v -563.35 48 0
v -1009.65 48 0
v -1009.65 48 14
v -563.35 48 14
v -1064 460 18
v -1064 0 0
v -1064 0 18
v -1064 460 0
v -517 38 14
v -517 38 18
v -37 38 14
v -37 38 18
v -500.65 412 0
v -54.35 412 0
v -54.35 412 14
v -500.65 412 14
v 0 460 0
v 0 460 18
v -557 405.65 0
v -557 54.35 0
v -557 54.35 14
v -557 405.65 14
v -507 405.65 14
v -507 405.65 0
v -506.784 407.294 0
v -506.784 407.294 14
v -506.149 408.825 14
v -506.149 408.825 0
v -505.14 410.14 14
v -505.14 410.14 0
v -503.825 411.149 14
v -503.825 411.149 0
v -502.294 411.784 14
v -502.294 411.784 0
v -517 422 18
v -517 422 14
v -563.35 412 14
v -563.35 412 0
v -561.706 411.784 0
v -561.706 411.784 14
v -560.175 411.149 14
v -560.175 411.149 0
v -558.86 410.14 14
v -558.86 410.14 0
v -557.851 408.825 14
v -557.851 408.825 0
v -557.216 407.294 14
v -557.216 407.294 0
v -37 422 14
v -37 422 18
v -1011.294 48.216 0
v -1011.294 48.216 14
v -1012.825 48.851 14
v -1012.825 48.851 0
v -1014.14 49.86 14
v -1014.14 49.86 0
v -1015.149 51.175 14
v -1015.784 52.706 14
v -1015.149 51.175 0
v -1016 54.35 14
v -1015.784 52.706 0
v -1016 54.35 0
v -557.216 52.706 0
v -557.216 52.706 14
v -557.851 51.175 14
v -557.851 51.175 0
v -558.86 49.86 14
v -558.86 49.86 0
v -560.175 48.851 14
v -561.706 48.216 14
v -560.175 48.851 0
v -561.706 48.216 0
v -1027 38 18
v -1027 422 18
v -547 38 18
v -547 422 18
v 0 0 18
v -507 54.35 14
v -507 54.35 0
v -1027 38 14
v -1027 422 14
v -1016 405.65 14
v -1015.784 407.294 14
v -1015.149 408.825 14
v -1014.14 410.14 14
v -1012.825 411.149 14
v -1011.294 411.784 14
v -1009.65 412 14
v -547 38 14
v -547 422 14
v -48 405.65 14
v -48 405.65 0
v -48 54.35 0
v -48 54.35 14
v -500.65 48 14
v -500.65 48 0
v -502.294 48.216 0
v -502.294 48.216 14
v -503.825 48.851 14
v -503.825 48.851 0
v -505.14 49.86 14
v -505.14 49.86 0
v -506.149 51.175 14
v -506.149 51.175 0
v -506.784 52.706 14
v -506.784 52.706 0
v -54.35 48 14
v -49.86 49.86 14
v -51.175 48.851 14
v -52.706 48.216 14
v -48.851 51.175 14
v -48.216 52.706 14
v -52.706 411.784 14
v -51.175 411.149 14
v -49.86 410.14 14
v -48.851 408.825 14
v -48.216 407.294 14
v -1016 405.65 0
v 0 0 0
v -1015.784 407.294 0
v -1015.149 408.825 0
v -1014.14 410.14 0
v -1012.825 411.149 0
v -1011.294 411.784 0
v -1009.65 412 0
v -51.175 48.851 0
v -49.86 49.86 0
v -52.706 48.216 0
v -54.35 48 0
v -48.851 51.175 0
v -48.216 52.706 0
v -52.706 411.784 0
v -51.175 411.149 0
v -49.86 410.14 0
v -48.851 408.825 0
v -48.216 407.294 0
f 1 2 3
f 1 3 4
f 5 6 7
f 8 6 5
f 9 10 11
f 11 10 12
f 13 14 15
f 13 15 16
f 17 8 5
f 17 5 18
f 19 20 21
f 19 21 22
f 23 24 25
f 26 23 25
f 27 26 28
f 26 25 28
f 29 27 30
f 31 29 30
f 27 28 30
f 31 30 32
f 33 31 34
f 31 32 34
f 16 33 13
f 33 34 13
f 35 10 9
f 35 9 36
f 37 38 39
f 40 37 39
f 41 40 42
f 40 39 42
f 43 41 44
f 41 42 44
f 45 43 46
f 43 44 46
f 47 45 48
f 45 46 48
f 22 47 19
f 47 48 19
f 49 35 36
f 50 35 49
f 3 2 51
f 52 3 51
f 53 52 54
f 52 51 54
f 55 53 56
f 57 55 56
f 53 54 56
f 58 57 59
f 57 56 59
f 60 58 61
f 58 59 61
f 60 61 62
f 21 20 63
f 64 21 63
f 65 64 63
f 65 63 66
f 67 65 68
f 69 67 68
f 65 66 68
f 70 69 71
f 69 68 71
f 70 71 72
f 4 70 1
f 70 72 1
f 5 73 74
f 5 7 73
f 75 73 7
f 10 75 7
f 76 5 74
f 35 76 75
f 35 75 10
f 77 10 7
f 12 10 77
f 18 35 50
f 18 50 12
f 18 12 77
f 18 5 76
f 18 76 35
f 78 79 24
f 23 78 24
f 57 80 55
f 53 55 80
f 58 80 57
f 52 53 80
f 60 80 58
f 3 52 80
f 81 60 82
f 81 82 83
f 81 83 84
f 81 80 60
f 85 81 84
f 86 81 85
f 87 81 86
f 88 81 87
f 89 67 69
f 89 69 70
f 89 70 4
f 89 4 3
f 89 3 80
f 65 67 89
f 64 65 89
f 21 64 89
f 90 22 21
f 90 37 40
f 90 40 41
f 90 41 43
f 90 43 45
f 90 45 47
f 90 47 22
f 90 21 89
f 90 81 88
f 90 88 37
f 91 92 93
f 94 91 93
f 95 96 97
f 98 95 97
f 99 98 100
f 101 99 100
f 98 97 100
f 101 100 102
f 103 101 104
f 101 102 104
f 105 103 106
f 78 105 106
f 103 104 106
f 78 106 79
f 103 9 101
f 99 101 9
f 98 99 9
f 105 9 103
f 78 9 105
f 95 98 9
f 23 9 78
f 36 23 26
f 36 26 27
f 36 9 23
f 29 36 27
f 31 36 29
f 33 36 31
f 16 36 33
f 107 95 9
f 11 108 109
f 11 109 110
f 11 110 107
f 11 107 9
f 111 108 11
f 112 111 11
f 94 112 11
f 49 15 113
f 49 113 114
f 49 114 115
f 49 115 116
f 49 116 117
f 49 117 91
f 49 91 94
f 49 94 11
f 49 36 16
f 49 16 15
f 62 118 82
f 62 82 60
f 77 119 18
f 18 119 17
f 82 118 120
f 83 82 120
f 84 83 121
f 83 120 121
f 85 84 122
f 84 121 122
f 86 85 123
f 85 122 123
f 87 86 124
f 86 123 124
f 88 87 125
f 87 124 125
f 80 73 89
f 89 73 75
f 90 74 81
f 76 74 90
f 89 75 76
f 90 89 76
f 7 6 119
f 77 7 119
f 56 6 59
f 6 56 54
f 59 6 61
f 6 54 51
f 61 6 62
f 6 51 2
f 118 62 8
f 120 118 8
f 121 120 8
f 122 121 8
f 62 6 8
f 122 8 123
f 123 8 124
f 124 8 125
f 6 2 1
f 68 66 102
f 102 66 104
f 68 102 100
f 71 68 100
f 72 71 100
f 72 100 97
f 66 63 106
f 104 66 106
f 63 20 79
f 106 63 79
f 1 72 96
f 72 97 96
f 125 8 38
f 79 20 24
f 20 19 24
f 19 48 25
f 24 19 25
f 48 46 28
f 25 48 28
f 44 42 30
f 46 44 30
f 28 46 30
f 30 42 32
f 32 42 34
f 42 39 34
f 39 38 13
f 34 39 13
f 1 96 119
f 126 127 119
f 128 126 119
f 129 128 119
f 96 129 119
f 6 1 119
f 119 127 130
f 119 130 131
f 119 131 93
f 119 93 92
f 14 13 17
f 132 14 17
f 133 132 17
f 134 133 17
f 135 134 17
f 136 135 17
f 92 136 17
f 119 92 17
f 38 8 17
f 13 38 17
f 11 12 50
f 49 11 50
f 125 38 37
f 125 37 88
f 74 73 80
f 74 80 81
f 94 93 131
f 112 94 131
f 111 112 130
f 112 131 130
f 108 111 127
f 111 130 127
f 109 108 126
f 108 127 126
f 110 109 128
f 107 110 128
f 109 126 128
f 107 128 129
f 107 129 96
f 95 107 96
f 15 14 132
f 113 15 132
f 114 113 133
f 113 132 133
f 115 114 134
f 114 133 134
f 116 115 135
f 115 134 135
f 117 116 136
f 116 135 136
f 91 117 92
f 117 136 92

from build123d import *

# Parameters (mm, degrees)
SKETCH_W        = 1064
SKETCH_H        = 460
PAD_DEPTH       = 18
POCKET003_DEPTH = 18.001
SKETCH005_W     = 480
SKETCH005_H     = 384
POCKET_DEPTH    = 4


with BuildPart() as part:
    # Sketch → Pad (new body)
    with BuildSketch(Plane.XY):
        with Locations((-532, 230)):
            Rectangle(SKETCH_W, SKETCH_H)
    extrude(amount=PAD_DEPTH)

    # Sketch004 → Pocket003 (cut, through all)
    with BuildSketch(Plane(origin=(0, 0, 0), x_dir=(1, 0, 0), z_dir=(0, 0, -1))):
        with BuildLine():
            Line((-54.35, -412), (-500.65, -412))
            ThreePointArc((-507, -405.65), (-505.140128, -410.140128), (-500.65, -412))
            Line((-507, -54.35), (-507, -405.65))
            ThreePointArc((-500.65, -48), (-505.140128, -49.859872), (-507, -54.35))
            Line((-54.35, -48), (-500.65, -48))
            ThreePointArc((-48, -54.35), (-49.859872, -49.859872), (-54.35, -48))
            Line((-48, -405.65), (-48, -54.35))
            ThreePointArc((-54.35, -412), (-49.859872, -410.140128), (-48, -405.65))
        make_face()
        with BuildLine():
            Line((-557, -54.35), (-557, -405.65))
            ThreePointArc((-563.35, -412), (-558.859872, -410.140128), (-557, -405.65))
            Line((-563.35, -412), (-1009.65, -412))
            ThreePointArc((-1016, -405.65), (-1014.140128, -410.140128), (-1009.65, -412))
            Line((-1016, -405.65), (-1016, -54.35))
            ThreePointArc((-1009.65, -48), (-1014.140128, -49.859872), (-1016, -54.35))
            Line((-1009.65, -48), (-563.35, -48))
            ThreePointArc((-557, -54.35), (-558.859872, -49.859872), (-563.35, -48))
        make_face()
    extrude(amount=-POCKET003_DEPTH, mode=Mode.SUBTRACT)

    # Sketch005 (on Face5 of Pocket003) → Pocket (cut)
    with BuildSketch(Plane.XY.offset(18)):
        with Locations((-277, 230)):
            Rectangle(SKETCH005_W, SKETCH005_H)
        with Locations((-787, 230)):
            Rectangle(SKETCH005_W, SKETCH005_H)
    extrude(amount=-POCKET_DEPTH, mode=Mode.SUBTRACT)


solid = part.part
